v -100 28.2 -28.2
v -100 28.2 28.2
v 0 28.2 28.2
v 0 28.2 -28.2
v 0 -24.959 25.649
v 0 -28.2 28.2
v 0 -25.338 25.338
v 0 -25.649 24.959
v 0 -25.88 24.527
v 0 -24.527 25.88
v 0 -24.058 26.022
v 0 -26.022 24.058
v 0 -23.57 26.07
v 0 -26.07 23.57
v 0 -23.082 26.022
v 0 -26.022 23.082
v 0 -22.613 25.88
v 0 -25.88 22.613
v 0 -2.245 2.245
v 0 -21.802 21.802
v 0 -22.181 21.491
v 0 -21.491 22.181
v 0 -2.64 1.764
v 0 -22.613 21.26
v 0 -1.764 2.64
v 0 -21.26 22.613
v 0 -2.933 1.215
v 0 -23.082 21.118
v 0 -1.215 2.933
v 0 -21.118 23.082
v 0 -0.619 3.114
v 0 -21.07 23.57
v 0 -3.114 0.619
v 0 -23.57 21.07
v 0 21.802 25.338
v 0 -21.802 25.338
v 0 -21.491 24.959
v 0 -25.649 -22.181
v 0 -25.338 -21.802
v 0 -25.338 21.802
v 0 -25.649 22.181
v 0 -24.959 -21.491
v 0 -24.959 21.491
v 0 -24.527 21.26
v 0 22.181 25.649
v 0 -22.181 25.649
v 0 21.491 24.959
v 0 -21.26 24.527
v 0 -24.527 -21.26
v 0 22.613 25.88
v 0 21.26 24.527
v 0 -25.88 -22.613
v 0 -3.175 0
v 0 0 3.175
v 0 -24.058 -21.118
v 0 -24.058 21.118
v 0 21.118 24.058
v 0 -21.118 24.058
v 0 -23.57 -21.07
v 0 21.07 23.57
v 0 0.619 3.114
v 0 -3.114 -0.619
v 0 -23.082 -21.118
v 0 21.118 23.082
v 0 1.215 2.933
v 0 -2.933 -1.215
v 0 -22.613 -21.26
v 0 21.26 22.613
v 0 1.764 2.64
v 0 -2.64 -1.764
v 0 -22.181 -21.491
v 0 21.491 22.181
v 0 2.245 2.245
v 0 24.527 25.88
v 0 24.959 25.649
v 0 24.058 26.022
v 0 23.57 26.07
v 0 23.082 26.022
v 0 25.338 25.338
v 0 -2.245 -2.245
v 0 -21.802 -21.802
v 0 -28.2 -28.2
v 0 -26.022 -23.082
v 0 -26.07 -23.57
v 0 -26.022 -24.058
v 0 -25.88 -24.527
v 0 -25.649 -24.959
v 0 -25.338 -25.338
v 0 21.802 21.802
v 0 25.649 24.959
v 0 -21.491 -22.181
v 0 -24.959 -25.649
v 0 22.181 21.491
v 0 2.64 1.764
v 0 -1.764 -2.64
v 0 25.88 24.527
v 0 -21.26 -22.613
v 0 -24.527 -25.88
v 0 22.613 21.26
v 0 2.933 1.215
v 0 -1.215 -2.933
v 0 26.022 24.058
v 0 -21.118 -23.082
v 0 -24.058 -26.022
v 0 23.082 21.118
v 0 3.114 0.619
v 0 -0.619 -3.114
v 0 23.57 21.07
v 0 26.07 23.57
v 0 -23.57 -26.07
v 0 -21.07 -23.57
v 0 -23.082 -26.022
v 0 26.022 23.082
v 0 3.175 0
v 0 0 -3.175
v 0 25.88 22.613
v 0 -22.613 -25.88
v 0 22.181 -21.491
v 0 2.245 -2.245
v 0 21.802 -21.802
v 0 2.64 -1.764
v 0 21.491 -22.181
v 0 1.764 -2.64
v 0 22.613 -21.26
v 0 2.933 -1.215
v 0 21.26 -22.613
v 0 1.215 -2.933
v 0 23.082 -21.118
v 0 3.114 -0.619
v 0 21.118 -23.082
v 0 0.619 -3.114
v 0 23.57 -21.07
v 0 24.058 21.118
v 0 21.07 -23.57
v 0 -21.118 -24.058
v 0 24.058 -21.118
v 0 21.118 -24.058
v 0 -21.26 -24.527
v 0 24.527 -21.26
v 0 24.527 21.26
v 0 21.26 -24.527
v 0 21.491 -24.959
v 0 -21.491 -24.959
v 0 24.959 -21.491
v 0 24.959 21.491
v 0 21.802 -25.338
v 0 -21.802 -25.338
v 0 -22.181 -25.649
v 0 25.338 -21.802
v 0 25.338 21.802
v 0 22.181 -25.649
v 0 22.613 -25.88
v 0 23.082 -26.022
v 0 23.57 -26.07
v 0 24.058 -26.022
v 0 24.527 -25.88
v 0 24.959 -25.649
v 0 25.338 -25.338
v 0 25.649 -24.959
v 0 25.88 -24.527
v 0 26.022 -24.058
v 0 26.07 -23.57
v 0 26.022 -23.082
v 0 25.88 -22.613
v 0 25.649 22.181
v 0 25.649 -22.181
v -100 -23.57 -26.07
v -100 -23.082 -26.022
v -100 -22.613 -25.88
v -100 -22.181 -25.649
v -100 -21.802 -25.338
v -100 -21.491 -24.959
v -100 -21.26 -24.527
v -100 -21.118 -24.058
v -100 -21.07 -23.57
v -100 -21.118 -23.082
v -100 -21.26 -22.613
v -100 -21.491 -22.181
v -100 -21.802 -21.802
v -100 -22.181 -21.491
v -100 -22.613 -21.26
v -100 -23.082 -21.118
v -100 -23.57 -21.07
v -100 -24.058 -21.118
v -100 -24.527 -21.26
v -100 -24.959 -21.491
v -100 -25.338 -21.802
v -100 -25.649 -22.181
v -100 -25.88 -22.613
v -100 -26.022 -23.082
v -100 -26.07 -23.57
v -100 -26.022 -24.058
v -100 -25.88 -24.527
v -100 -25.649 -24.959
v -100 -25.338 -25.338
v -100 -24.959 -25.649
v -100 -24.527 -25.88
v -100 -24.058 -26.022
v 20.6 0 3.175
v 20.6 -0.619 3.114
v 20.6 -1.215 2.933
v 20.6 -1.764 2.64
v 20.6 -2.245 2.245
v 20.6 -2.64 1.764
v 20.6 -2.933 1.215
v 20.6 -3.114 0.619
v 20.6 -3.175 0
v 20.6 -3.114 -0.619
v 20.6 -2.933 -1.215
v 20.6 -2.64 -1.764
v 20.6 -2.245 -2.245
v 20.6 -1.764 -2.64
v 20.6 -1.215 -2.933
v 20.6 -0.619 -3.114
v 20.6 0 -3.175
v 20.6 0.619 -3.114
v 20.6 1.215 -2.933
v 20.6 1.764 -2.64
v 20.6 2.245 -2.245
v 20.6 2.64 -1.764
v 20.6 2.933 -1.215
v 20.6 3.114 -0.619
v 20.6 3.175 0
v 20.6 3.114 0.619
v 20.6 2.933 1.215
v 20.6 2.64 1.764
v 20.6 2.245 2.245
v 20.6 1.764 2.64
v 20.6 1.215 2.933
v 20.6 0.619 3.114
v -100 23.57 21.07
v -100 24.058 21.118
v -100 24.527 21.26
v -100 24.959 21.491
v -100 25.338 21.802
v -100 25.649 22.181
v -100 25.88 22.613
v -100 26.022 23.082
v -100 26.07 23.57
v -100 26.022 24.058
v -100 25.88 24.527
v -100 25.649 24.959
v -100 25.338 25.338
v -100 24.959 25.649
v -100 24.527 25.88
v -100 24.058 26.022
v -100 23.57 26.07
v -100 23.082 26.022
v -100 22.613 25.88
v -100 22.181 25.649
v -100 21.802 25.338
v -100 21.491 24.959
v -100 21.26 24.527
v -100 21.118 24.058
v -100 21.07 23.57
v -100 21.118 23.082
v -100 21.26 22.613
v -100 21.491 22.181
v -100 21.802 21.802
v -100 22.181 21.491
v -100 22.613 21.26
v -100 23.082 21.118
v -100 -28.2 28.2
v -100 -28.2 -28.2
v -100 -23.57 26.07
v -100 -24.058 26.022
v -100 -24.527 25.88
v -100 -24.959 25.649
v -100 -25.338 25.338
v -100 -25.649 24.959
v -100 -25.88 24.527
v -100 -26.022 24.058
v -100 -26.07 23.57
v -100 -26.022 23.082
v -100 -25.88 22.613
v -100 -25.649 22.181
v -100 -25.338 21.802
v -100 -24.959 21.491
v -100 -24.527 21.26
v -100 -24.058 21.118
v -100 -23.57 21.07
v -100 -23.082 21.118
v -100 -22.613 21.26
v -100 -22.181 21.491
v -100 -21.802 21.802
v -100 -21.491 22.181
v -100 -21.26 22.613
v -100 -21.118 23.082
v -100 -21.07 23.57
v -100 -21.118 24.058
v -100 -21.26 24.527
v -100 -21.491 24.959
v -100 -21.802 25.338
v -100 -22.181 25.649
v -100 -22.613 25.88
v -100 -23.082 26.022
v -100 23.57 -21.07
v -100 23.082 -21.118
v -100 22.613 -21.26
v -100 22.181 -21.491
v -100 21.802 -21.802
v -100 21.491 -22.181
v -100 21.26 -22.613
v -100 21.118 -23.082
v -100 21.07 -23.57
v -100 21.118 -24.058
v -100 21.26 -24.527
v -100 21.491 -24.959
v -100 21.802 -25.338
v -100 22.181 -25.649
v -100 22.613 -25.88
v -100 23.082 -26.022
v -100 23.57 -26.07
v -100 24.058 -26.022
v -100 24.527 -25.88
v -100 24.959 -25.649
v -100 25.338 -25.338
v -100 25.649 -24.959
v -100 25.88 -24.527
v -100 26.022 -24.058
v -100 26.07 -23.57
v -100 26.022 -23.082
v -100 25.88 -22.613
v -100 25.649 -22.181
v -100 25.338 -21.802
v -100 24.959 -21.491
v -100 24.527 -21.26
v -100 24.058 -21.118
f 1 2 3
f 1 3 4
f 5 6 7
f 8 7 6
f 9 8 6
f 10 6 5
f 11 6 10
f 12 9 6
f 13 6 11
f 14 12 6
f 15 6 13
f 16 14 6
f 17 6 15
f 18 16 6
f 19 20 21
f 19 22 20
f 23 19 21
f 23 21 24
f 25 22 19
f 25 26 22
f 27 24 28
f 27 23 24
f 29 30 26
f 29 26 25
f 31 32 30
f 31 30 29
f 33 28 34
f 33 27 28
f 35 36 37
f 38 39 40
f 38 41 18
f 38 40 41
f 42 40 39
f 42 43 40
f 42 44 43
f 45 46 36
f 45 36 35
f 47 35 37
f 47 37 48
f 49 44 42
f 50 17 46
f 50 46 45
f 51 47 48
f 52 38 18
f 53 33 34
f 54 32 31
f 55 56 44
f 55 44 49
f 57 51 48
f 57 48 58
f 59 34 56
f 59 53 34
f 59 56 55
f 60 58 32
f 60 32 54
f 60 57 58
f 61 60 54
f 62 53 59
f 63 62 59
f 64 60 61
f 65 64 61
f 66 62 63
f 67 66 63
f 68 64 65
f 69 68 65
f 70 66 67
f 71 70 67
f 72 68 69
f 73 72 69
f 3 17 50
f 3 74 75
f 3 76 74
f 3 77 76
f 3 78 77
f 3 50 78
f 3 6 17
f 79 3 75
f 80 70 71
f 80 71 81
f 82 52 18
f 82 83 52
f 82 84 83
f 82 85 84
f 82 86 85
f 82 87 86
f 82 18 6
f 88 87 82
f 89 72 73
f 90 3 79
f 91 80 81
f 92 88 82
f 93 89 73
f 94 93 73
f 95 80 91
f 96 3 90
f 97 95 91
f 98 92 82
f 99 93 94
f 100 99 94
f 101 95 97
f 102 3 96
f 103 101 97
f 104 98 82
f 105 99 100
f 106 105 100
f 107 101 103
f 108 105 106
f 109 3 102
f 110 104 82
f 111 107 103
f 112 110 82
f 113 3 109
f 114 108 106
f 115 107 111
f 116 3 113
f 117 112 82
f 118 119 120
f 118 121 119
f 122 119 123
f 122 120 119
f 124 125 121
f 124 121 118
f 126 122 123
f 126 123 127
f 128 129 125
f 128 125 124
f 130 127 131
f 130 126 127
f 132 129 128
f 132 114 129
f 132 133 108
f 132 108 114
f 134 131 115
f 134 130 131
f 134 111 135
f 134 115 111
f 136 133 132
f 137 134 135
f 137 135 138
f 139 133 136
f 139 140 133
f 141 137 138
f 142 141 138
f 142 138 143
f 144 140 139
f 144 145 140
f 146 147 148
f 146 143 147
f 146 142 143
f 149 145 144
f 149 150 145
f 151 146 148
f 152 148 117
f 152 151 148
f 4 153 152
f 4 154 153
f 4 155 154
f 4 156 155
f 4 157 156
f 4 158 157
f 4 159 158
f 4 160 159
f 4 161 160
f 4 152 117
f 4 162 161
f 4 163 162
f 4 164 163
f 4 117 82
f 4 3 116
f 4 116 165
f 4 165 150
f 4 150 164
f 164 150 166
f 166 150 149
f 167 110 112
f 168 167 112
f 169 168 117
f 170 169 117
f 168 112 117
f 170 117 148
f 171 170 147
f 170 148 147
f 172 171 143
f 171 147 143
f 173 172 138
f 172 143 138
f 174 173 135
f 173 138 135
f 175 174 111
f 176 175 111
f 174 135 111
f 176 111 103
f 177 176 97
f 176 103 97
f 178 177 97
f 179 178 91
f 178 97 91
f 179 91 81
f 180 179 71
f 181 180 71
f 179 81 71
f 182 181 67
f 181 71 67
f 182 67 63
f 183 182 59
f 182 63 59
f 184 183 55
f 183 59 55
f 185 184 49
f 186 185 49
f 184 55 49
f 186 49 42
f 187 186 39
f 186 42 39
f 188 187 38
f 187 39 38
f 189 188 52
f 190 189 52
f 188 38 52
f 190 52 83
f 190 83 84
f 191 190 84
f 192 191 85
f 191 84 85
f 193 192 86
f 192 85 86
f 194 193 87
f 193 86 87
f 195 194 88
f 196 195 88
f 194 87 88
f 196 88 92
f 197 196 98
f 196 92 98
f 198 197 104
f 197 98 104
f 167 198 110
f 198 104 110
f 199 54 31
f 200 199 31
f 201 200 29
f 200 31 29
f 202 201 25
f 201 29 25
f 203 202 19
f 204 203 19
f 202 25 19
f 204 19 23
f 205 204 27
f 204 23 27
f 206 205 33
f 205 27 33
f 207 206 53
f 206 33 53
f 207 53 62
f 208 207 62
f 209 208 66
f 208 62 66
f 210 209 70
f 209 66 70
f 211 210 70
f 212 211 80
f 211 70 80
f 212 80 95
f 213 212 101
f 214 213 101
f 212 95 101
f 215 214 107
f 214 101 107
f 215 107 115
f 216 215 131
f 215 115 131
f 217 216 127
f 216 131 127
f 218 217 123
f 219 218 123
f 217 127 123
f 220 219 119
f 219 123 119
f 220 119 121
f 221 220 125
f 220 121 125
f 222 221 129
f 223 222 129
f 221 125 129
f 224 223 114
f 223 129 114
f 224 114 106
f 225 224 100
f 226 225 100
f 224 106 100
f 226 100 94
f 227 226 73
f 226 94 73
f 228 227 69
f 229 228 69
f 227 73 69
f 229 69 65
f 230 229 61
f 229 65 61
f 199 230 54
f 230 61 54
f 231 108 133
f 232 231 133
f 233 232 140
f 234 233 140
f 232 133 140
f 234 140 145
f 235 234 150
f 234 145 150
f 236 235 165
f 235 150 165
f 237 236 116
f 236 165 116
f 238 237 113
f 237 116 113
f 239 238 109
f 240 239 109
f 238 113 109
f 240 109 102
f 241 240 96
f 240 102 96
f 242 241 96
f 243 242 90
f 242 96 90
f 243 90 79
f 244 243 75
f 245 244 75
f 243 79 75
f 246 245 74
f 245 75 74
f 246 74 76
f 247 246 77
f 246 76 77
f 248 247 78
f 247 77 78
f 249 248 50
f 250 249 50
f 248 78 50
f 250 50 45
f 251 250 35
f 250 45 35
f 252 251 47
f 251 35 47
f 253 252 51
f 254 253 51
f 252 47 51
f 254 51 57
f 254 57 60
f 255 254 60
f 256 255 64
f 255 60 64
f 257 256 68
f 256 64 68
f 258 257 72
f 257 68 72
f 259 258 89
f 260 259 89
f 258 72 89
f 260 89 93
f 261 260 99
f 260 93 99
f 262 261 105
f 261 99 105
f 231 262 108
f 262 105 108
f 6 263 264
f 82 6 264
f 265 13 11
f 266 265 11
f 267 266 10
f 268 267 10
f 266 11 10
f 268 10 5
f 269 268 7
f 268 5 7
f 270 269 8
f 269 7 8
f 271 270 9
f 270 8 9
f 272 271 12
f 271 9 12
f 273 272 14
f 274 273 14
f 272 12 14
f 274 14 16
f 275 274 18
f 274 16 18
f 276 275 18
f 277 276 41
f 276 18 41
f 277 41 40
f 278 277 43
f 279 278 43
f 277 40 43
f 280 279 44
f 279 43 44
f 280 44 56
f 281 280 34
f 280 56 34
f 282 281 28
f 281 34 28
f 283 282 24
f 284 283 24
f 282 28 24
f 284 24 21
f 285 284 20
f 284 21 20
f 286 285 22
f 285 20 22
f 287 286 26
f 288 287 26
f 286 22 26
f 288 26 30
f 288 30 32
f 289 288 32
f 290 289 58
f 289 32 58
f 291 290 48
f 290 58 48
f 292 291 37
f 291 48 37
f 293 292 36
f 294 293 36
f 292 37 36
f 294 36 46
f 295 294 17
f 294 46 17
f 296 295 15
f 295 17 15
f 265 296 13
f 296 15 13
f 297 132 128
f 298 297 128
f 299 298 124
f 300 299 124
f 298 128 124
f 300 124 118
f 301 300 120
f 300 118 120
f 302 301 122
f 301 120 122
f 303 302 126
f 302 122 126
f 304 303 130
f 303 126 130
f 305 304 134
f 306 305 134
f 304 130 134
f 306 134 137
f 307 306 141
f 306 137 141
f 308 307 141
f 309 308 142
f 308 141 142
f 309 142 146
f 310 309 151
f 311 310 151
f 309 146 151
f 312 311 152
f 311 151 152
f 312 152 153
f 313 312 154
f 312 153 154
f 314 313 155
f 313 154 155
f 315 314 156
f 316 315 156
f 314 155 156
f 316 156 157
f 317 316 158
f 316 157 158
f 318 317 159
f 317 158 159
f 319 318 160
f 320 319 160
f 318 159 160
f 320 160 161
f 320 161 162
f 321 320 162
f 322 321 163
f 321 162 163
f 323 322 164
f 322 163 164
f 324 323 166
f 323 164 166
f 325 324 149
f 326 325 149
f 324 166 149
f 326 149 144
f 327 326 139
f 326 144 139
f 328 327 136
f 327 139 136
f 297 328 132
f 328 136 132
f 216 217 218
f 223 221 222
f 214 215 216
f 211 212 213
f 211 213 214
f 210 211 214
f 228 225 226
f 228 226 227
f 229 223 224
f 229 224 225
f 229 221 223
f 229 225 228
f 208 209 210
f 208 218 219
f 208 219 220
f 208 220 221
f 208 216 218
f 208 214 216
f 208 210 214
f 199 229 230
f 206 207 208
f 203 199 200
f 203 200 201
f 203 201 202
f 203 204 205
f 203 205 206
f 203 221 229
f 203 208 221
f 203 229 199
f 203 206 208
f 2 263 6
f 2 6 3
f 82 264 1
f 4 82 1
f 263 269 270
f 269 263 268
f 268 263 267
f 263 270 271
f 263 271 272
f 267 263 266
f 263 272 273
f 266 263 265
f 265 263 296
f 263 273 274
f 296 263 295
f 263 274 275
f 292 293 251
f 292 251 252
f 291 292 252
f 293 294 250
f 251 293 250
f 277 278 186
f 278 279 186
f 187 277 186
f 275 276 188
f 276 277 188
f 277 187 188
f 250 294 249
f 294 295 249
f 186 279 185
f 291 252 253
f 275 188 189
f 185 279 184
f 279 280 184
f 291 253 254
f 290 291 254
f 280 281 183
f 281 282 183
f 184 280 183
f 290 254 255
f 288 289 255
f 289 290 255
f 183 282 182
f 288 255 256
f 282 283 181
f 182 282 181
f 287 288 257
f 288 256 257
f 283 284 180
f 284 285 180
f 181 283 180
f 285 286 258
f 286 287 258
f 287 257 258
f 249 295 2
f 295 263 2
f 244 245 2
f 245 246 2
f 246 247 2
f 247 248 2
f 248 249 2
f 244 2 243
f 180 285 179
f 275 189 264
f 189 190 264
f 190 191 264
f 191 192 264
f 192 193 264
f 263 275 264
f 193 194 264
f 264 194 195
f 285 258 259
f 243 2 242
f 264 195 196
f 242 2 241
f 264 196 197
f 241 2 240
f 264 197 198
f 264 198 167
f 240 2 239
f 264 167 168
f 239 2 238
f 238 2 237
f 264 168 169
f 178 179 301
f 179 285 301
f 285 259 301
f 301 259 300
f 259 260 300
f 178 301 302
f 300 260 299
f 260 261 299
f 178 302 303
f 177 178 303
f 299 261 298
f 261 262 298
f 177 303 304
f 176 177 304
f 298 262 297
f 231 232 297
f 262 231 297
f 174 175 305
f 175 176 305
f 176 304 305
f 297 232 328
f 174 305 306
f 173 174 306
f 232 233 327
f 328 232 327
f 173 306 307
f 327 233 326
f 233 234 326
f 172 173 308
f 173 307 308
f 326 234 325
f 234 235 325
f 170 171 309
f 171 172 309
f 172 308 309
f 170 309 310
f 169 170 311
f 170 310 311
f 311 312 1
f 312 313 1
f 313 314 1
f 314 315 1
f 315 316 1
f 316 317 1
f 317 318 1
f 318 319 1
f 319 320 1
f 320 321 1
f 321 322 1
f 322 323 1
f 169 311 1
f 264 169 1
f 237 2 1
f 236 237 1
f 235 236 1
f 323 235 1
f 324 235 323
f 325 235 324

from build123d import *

# Parameters (mm, degrees)
SKETCH2_W           = 56.4
SKETCH2_H           = 56.4
BOSS_EXTRUDE1_DEPTH = 100
SKETCH3_R           = 2.5
CUT_EXTRUDE1_DEPTH  = 100
SKETCH4_R           = 3.175
BOSS_EXTRUDE2_DEPTH = 20.6


with BuildPart() as part:
    # Sketch2 → Boss-Extrude1 (new body)
    with BuildSketch(Plane(origin=(0, 0, 0), x_dir=(0, 0, -1), z_dir=(1, 0, 0))):
        Rectangle(SKETCH2_W, SKETCH2_H)
    extrude(amount=-BOSS_EXTRUDE1_DEPTH)

    # Sketch3 → Cut-Extrude1 (cut)
    with BuildSketch(Plane(origin=(0, 0, 0), x_dir=(0, 0, -1), z_dir=(1, 0, 0))):
        with Locations((-23.57, 23.57)):
            Circle(SKETCH3_R)
        with Locations(Location((23.57, 23.57, 0), (0, 0, 180))):
            Circle(SKETCH3_R)
        with Locations((23.57, -23.57)):
            Circle(SKETCH3_R)
        with Locations(Location((-23.57, -23.57, 0), (0, 0, 180))):
            Circle(SKETCH3_R)
    extrude(amount=-CUT_EXTRUDE1_DEPTH, mode=Mode.SUBTRACT)

    # Sketch4 → Boss-Extrude2 (add)
    with BuildSketch(Plane(origin=(0, 0, 0), x_dir=(0, 0, -1), z_dir=(1, 0, 0))):
        with Locations(Location((0, 0, 0), (0, 0, 180))):
            Circle(SKETCH4_R)
    extrude(amount=BOSS_EXTRUDE2_DEPTH)


solid = part.part
